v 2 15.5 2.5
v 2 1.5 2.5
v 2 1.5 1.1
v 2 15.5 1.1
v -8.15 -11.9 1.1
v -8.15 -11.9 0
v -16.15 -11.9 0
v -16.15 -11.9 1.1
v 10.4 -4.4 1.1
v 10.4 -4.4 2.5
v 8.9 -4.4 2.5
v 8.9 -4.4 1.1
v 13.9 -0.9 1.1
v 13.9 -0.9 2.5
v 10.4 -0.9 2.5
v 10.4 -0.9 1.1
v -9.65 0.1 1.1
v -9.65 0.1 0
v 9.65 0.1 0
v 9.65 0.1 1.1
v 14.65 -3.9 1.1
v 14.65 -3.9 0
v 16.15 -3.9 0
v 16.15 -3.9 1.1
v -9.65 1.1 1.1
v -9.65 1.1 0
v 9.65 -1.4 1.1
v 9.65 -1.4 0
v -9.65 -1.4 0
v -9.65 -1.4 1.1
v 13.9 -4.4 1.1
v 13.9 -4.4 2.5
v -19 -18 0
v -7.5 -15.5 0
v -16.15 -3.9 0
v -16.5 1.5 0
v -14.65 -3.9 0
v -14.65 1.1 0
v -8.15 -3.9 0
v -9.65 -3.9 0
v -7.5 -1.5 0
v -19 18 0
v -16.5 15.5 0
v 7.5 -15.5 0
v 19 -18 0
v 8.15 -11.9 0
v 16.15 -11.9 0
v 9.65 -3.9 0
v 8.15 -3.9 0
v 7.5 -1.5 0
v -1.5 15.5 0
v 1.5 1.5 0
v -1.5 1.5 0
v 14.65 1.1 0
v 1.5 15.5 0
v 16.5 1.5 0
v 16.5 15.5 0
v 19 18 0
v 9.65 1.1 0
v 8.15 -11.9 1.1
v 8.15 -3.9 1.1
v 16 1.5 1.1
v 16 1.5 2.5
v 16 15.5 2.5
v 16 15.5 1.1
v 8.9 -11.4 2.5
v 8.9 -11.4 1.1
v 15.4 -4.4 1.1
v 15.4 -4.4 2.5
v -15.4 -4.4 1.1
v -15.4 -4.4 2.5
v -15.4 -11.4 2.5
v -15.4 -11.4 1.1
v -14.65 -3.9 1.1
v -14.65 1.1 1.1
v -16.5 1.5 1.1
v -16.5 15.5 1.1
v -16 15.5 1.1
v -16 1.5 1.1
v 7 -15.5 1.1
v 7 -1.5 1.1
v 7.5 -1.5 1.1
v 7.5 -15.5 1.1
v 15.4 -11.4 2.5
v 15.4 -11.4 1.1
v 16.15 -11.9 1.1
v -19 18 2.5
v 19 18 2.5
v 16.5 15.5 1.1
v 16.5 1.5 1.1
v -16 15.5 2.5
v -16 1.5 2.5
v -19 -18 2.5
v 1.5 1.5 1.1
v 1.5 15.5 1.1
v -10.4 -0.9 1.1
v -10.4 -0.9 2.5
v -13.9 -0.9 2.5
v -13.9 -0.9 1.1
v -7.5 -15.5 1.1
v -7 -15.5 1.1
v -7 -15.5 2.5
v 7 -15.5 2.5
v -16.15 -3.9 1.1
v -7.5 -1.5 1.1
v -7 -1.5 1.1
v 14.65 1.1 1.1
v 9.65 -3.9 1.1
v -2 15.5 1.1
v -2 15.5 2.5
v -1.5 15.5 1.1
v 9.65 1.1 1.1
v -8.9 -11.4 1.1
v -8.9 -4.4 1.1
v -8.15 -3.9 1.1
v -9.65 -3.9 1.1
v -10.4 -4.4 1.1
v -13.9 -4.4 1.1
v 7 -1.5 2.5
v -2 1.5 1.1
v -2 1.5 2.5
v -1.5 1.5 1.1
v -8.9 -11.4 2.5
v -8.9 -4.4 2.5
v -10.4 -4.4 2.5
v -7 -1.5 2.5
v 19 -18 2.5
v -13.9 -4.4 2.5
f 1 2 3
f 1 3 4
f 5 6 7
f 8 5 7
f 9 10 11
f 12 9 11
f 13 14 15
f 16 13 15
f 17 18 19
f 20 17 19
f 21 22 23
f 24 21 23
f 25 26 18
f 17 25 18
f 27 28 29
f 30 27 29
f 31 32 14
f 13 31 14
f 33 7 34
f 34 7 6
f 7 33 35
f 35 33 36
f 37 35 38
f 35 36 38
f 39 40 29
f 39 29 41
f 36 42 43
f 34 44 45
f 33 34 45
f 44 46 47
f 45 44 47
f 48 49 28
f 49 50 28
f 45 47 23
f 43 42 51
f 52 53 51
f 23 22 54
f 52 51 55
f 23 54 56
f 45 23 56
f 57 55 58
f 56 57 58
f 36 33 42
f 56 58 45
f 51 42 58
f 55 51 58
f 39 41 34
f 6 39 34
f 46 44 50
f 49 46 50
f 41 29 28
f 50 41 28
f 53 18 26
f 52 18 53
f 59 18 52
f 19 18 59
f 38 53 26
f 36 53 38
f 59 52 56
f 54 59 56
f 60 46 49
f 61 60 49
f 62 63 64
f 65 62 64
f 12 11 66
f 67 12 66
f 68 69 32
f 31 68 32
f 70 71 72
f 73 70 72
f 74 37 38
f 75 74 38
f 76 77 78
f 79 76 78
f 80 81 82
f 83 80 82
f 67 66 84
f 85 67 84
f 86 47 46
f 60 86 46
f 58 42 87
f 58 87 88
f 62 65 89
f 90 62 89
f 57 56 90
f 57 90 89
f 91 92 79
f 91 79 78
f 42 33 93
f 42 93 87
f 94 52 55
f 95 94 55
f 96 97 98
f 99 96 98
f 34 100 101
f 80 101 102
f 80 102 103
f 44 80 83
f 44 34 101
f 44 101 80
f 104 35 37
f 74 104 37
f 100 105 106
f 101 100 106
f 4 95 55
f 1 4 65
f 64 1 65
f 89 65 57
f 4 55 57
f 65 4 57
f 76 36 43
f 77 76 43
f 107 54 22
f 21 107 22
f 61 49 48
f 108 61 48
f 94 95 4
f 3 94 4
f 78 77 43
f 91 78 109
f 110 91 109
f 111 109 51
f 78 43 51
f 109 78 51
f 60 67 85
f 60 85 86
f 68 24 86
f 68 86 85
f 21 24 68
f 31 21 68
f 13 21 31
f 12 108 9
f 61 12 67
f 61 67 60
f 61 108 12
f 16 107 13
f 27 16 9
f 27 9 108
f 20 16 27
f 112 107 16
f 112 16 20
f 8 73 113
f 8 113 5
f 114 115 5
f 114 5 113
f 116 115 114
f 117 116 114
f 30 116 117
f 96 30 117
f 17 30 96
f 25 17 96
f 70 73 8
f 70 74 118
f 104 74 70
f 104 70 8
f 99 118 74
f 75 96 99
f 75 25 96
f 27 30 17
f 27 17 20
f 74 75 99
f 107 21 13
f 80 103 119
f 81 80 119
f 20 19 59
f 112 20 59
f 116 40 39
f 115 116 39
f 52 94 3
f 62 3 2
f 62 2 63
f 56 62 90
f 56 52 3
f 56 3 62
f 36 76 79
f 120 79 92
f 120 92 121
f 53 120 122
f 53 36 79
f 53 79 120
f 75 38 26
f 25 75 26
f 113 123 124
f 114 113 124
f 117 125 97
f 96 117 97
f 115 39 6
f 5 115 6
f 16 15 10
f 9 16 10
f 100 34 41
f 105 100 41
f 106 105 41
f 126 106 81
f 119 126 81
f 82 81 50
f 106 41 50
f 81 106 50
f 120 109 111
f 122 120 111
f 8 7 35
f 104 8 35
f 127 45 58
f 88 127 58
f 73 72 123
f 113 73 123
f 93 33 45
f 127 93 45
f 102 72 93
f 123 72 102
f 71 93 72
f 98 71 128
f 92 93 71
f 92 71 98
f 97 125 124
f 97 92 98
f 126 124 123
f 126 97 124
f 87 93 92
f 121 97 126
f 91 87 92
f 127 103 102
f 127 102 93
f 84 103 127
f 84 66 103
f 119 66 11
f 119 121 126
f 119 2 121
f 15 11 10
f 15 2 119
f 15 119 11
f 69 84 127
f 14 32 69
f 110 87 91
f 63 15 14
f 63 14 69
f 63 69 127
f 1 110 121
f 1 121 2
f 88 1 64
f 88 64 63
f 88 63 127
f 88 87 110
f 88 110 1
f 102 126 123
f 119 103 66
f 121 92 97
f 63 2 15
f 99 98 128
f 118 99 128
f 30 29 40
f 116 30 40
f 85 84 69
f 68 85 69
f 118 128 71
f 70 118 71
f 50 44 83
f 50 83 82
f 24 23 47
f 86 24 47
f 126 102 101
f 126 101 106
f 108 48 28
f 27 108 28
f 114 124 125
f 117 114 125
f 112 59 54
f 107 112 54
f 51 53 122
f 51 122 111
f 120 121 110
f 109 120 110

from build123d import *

# Parameters (mm, degrees)
SKETCH_W        = 38
SKETCH_H        = 36
PAD_DEPTH       = 2.5
SKETCH001_W     = 14
SKETCH001_H     = 14
POCKET_DEPTH    = 1.4
SKETCH002_W     = 15
SKETCH002_H     = 14
POCKET001_DEPTH = 1.1


with BuildPart() as part:
    # Sketch → Pad (new body)
    with BuildSketch(Plane.XY):
        Rectangle(SKETCH_W, SKETCH_H)
    extrude(amount=PAD_DEPTH)

    # Sketch001 (on DatumPlane) → Pocket (cut)
    with BuildSketch(Plane.XY.offset(2.5)):
        with Locations((-9, 8.5)):
            Rectangle(SKETCH001_W, SKETCH001_H)
        with Locations((9, 8.5)):
            Rectangle(SKETCH001_W, SKETCH001_H)
        with Locations((0, -8.5)):
            Rectangle(SKETCH001_W, SKETCH001_H)
        Polygon((10.4, -0.9), (10.4, -4.4), (8.9, -4.4), (8.9, -11.4), (15.4, -11.4), (15.4, -4.4), (13.9, -4.4), (13.9, -0.9), align=None)
        Polygon((-15.4, -11.4), (-8.9, -11.4), (-8.9, -4.4), (-10.4, -4.4), (-10.4, -0.9), (-13.9, -0.9), (-13.9, -4.4), (-15.4, -4.4), align=None)
    extrude(amount=-POCKET_DEPTH, mode=Mode.SUBTRACT)

    # Sketch002 → Pocket001 (cut)
    with BuildSketch(Plane.XY):
        with Locations((9, 8.5)):
            Rectangle(SKETCH002_W, SKETCH002_H)
        with Locations((-9, 8.5)):
            Rectangle(SKETCH002_W, SKETCH002_H)
        with Locations((0, -8.5)):
            Rectangle(SKETCH002_W, SKETCH002_H)
        Polygon((8.15, -11.9), (8.15, -3.9), (9.65, -3.9), (9.65, -1.4), (-9.65, -1.4), (-9.65, -3.9), (-8.15, -3.9), (-8.15, -11.9), (-16.15, -11.9), (-16.15, -3.9), (-14.65, -3.9), (-14.65, 1.1), (-9.65, 1.1), (-9.65, 0.1), (9.65, 0.1), (9.65, 1.1), (14.65, 1.1), (14.65, -3.9), (16.15, -3.9), (16.15, -11.9), align=None)
    extrude(amount=POCKET001_DEPTH, mode=Mode.SUBTRACT)


solid = part.part
